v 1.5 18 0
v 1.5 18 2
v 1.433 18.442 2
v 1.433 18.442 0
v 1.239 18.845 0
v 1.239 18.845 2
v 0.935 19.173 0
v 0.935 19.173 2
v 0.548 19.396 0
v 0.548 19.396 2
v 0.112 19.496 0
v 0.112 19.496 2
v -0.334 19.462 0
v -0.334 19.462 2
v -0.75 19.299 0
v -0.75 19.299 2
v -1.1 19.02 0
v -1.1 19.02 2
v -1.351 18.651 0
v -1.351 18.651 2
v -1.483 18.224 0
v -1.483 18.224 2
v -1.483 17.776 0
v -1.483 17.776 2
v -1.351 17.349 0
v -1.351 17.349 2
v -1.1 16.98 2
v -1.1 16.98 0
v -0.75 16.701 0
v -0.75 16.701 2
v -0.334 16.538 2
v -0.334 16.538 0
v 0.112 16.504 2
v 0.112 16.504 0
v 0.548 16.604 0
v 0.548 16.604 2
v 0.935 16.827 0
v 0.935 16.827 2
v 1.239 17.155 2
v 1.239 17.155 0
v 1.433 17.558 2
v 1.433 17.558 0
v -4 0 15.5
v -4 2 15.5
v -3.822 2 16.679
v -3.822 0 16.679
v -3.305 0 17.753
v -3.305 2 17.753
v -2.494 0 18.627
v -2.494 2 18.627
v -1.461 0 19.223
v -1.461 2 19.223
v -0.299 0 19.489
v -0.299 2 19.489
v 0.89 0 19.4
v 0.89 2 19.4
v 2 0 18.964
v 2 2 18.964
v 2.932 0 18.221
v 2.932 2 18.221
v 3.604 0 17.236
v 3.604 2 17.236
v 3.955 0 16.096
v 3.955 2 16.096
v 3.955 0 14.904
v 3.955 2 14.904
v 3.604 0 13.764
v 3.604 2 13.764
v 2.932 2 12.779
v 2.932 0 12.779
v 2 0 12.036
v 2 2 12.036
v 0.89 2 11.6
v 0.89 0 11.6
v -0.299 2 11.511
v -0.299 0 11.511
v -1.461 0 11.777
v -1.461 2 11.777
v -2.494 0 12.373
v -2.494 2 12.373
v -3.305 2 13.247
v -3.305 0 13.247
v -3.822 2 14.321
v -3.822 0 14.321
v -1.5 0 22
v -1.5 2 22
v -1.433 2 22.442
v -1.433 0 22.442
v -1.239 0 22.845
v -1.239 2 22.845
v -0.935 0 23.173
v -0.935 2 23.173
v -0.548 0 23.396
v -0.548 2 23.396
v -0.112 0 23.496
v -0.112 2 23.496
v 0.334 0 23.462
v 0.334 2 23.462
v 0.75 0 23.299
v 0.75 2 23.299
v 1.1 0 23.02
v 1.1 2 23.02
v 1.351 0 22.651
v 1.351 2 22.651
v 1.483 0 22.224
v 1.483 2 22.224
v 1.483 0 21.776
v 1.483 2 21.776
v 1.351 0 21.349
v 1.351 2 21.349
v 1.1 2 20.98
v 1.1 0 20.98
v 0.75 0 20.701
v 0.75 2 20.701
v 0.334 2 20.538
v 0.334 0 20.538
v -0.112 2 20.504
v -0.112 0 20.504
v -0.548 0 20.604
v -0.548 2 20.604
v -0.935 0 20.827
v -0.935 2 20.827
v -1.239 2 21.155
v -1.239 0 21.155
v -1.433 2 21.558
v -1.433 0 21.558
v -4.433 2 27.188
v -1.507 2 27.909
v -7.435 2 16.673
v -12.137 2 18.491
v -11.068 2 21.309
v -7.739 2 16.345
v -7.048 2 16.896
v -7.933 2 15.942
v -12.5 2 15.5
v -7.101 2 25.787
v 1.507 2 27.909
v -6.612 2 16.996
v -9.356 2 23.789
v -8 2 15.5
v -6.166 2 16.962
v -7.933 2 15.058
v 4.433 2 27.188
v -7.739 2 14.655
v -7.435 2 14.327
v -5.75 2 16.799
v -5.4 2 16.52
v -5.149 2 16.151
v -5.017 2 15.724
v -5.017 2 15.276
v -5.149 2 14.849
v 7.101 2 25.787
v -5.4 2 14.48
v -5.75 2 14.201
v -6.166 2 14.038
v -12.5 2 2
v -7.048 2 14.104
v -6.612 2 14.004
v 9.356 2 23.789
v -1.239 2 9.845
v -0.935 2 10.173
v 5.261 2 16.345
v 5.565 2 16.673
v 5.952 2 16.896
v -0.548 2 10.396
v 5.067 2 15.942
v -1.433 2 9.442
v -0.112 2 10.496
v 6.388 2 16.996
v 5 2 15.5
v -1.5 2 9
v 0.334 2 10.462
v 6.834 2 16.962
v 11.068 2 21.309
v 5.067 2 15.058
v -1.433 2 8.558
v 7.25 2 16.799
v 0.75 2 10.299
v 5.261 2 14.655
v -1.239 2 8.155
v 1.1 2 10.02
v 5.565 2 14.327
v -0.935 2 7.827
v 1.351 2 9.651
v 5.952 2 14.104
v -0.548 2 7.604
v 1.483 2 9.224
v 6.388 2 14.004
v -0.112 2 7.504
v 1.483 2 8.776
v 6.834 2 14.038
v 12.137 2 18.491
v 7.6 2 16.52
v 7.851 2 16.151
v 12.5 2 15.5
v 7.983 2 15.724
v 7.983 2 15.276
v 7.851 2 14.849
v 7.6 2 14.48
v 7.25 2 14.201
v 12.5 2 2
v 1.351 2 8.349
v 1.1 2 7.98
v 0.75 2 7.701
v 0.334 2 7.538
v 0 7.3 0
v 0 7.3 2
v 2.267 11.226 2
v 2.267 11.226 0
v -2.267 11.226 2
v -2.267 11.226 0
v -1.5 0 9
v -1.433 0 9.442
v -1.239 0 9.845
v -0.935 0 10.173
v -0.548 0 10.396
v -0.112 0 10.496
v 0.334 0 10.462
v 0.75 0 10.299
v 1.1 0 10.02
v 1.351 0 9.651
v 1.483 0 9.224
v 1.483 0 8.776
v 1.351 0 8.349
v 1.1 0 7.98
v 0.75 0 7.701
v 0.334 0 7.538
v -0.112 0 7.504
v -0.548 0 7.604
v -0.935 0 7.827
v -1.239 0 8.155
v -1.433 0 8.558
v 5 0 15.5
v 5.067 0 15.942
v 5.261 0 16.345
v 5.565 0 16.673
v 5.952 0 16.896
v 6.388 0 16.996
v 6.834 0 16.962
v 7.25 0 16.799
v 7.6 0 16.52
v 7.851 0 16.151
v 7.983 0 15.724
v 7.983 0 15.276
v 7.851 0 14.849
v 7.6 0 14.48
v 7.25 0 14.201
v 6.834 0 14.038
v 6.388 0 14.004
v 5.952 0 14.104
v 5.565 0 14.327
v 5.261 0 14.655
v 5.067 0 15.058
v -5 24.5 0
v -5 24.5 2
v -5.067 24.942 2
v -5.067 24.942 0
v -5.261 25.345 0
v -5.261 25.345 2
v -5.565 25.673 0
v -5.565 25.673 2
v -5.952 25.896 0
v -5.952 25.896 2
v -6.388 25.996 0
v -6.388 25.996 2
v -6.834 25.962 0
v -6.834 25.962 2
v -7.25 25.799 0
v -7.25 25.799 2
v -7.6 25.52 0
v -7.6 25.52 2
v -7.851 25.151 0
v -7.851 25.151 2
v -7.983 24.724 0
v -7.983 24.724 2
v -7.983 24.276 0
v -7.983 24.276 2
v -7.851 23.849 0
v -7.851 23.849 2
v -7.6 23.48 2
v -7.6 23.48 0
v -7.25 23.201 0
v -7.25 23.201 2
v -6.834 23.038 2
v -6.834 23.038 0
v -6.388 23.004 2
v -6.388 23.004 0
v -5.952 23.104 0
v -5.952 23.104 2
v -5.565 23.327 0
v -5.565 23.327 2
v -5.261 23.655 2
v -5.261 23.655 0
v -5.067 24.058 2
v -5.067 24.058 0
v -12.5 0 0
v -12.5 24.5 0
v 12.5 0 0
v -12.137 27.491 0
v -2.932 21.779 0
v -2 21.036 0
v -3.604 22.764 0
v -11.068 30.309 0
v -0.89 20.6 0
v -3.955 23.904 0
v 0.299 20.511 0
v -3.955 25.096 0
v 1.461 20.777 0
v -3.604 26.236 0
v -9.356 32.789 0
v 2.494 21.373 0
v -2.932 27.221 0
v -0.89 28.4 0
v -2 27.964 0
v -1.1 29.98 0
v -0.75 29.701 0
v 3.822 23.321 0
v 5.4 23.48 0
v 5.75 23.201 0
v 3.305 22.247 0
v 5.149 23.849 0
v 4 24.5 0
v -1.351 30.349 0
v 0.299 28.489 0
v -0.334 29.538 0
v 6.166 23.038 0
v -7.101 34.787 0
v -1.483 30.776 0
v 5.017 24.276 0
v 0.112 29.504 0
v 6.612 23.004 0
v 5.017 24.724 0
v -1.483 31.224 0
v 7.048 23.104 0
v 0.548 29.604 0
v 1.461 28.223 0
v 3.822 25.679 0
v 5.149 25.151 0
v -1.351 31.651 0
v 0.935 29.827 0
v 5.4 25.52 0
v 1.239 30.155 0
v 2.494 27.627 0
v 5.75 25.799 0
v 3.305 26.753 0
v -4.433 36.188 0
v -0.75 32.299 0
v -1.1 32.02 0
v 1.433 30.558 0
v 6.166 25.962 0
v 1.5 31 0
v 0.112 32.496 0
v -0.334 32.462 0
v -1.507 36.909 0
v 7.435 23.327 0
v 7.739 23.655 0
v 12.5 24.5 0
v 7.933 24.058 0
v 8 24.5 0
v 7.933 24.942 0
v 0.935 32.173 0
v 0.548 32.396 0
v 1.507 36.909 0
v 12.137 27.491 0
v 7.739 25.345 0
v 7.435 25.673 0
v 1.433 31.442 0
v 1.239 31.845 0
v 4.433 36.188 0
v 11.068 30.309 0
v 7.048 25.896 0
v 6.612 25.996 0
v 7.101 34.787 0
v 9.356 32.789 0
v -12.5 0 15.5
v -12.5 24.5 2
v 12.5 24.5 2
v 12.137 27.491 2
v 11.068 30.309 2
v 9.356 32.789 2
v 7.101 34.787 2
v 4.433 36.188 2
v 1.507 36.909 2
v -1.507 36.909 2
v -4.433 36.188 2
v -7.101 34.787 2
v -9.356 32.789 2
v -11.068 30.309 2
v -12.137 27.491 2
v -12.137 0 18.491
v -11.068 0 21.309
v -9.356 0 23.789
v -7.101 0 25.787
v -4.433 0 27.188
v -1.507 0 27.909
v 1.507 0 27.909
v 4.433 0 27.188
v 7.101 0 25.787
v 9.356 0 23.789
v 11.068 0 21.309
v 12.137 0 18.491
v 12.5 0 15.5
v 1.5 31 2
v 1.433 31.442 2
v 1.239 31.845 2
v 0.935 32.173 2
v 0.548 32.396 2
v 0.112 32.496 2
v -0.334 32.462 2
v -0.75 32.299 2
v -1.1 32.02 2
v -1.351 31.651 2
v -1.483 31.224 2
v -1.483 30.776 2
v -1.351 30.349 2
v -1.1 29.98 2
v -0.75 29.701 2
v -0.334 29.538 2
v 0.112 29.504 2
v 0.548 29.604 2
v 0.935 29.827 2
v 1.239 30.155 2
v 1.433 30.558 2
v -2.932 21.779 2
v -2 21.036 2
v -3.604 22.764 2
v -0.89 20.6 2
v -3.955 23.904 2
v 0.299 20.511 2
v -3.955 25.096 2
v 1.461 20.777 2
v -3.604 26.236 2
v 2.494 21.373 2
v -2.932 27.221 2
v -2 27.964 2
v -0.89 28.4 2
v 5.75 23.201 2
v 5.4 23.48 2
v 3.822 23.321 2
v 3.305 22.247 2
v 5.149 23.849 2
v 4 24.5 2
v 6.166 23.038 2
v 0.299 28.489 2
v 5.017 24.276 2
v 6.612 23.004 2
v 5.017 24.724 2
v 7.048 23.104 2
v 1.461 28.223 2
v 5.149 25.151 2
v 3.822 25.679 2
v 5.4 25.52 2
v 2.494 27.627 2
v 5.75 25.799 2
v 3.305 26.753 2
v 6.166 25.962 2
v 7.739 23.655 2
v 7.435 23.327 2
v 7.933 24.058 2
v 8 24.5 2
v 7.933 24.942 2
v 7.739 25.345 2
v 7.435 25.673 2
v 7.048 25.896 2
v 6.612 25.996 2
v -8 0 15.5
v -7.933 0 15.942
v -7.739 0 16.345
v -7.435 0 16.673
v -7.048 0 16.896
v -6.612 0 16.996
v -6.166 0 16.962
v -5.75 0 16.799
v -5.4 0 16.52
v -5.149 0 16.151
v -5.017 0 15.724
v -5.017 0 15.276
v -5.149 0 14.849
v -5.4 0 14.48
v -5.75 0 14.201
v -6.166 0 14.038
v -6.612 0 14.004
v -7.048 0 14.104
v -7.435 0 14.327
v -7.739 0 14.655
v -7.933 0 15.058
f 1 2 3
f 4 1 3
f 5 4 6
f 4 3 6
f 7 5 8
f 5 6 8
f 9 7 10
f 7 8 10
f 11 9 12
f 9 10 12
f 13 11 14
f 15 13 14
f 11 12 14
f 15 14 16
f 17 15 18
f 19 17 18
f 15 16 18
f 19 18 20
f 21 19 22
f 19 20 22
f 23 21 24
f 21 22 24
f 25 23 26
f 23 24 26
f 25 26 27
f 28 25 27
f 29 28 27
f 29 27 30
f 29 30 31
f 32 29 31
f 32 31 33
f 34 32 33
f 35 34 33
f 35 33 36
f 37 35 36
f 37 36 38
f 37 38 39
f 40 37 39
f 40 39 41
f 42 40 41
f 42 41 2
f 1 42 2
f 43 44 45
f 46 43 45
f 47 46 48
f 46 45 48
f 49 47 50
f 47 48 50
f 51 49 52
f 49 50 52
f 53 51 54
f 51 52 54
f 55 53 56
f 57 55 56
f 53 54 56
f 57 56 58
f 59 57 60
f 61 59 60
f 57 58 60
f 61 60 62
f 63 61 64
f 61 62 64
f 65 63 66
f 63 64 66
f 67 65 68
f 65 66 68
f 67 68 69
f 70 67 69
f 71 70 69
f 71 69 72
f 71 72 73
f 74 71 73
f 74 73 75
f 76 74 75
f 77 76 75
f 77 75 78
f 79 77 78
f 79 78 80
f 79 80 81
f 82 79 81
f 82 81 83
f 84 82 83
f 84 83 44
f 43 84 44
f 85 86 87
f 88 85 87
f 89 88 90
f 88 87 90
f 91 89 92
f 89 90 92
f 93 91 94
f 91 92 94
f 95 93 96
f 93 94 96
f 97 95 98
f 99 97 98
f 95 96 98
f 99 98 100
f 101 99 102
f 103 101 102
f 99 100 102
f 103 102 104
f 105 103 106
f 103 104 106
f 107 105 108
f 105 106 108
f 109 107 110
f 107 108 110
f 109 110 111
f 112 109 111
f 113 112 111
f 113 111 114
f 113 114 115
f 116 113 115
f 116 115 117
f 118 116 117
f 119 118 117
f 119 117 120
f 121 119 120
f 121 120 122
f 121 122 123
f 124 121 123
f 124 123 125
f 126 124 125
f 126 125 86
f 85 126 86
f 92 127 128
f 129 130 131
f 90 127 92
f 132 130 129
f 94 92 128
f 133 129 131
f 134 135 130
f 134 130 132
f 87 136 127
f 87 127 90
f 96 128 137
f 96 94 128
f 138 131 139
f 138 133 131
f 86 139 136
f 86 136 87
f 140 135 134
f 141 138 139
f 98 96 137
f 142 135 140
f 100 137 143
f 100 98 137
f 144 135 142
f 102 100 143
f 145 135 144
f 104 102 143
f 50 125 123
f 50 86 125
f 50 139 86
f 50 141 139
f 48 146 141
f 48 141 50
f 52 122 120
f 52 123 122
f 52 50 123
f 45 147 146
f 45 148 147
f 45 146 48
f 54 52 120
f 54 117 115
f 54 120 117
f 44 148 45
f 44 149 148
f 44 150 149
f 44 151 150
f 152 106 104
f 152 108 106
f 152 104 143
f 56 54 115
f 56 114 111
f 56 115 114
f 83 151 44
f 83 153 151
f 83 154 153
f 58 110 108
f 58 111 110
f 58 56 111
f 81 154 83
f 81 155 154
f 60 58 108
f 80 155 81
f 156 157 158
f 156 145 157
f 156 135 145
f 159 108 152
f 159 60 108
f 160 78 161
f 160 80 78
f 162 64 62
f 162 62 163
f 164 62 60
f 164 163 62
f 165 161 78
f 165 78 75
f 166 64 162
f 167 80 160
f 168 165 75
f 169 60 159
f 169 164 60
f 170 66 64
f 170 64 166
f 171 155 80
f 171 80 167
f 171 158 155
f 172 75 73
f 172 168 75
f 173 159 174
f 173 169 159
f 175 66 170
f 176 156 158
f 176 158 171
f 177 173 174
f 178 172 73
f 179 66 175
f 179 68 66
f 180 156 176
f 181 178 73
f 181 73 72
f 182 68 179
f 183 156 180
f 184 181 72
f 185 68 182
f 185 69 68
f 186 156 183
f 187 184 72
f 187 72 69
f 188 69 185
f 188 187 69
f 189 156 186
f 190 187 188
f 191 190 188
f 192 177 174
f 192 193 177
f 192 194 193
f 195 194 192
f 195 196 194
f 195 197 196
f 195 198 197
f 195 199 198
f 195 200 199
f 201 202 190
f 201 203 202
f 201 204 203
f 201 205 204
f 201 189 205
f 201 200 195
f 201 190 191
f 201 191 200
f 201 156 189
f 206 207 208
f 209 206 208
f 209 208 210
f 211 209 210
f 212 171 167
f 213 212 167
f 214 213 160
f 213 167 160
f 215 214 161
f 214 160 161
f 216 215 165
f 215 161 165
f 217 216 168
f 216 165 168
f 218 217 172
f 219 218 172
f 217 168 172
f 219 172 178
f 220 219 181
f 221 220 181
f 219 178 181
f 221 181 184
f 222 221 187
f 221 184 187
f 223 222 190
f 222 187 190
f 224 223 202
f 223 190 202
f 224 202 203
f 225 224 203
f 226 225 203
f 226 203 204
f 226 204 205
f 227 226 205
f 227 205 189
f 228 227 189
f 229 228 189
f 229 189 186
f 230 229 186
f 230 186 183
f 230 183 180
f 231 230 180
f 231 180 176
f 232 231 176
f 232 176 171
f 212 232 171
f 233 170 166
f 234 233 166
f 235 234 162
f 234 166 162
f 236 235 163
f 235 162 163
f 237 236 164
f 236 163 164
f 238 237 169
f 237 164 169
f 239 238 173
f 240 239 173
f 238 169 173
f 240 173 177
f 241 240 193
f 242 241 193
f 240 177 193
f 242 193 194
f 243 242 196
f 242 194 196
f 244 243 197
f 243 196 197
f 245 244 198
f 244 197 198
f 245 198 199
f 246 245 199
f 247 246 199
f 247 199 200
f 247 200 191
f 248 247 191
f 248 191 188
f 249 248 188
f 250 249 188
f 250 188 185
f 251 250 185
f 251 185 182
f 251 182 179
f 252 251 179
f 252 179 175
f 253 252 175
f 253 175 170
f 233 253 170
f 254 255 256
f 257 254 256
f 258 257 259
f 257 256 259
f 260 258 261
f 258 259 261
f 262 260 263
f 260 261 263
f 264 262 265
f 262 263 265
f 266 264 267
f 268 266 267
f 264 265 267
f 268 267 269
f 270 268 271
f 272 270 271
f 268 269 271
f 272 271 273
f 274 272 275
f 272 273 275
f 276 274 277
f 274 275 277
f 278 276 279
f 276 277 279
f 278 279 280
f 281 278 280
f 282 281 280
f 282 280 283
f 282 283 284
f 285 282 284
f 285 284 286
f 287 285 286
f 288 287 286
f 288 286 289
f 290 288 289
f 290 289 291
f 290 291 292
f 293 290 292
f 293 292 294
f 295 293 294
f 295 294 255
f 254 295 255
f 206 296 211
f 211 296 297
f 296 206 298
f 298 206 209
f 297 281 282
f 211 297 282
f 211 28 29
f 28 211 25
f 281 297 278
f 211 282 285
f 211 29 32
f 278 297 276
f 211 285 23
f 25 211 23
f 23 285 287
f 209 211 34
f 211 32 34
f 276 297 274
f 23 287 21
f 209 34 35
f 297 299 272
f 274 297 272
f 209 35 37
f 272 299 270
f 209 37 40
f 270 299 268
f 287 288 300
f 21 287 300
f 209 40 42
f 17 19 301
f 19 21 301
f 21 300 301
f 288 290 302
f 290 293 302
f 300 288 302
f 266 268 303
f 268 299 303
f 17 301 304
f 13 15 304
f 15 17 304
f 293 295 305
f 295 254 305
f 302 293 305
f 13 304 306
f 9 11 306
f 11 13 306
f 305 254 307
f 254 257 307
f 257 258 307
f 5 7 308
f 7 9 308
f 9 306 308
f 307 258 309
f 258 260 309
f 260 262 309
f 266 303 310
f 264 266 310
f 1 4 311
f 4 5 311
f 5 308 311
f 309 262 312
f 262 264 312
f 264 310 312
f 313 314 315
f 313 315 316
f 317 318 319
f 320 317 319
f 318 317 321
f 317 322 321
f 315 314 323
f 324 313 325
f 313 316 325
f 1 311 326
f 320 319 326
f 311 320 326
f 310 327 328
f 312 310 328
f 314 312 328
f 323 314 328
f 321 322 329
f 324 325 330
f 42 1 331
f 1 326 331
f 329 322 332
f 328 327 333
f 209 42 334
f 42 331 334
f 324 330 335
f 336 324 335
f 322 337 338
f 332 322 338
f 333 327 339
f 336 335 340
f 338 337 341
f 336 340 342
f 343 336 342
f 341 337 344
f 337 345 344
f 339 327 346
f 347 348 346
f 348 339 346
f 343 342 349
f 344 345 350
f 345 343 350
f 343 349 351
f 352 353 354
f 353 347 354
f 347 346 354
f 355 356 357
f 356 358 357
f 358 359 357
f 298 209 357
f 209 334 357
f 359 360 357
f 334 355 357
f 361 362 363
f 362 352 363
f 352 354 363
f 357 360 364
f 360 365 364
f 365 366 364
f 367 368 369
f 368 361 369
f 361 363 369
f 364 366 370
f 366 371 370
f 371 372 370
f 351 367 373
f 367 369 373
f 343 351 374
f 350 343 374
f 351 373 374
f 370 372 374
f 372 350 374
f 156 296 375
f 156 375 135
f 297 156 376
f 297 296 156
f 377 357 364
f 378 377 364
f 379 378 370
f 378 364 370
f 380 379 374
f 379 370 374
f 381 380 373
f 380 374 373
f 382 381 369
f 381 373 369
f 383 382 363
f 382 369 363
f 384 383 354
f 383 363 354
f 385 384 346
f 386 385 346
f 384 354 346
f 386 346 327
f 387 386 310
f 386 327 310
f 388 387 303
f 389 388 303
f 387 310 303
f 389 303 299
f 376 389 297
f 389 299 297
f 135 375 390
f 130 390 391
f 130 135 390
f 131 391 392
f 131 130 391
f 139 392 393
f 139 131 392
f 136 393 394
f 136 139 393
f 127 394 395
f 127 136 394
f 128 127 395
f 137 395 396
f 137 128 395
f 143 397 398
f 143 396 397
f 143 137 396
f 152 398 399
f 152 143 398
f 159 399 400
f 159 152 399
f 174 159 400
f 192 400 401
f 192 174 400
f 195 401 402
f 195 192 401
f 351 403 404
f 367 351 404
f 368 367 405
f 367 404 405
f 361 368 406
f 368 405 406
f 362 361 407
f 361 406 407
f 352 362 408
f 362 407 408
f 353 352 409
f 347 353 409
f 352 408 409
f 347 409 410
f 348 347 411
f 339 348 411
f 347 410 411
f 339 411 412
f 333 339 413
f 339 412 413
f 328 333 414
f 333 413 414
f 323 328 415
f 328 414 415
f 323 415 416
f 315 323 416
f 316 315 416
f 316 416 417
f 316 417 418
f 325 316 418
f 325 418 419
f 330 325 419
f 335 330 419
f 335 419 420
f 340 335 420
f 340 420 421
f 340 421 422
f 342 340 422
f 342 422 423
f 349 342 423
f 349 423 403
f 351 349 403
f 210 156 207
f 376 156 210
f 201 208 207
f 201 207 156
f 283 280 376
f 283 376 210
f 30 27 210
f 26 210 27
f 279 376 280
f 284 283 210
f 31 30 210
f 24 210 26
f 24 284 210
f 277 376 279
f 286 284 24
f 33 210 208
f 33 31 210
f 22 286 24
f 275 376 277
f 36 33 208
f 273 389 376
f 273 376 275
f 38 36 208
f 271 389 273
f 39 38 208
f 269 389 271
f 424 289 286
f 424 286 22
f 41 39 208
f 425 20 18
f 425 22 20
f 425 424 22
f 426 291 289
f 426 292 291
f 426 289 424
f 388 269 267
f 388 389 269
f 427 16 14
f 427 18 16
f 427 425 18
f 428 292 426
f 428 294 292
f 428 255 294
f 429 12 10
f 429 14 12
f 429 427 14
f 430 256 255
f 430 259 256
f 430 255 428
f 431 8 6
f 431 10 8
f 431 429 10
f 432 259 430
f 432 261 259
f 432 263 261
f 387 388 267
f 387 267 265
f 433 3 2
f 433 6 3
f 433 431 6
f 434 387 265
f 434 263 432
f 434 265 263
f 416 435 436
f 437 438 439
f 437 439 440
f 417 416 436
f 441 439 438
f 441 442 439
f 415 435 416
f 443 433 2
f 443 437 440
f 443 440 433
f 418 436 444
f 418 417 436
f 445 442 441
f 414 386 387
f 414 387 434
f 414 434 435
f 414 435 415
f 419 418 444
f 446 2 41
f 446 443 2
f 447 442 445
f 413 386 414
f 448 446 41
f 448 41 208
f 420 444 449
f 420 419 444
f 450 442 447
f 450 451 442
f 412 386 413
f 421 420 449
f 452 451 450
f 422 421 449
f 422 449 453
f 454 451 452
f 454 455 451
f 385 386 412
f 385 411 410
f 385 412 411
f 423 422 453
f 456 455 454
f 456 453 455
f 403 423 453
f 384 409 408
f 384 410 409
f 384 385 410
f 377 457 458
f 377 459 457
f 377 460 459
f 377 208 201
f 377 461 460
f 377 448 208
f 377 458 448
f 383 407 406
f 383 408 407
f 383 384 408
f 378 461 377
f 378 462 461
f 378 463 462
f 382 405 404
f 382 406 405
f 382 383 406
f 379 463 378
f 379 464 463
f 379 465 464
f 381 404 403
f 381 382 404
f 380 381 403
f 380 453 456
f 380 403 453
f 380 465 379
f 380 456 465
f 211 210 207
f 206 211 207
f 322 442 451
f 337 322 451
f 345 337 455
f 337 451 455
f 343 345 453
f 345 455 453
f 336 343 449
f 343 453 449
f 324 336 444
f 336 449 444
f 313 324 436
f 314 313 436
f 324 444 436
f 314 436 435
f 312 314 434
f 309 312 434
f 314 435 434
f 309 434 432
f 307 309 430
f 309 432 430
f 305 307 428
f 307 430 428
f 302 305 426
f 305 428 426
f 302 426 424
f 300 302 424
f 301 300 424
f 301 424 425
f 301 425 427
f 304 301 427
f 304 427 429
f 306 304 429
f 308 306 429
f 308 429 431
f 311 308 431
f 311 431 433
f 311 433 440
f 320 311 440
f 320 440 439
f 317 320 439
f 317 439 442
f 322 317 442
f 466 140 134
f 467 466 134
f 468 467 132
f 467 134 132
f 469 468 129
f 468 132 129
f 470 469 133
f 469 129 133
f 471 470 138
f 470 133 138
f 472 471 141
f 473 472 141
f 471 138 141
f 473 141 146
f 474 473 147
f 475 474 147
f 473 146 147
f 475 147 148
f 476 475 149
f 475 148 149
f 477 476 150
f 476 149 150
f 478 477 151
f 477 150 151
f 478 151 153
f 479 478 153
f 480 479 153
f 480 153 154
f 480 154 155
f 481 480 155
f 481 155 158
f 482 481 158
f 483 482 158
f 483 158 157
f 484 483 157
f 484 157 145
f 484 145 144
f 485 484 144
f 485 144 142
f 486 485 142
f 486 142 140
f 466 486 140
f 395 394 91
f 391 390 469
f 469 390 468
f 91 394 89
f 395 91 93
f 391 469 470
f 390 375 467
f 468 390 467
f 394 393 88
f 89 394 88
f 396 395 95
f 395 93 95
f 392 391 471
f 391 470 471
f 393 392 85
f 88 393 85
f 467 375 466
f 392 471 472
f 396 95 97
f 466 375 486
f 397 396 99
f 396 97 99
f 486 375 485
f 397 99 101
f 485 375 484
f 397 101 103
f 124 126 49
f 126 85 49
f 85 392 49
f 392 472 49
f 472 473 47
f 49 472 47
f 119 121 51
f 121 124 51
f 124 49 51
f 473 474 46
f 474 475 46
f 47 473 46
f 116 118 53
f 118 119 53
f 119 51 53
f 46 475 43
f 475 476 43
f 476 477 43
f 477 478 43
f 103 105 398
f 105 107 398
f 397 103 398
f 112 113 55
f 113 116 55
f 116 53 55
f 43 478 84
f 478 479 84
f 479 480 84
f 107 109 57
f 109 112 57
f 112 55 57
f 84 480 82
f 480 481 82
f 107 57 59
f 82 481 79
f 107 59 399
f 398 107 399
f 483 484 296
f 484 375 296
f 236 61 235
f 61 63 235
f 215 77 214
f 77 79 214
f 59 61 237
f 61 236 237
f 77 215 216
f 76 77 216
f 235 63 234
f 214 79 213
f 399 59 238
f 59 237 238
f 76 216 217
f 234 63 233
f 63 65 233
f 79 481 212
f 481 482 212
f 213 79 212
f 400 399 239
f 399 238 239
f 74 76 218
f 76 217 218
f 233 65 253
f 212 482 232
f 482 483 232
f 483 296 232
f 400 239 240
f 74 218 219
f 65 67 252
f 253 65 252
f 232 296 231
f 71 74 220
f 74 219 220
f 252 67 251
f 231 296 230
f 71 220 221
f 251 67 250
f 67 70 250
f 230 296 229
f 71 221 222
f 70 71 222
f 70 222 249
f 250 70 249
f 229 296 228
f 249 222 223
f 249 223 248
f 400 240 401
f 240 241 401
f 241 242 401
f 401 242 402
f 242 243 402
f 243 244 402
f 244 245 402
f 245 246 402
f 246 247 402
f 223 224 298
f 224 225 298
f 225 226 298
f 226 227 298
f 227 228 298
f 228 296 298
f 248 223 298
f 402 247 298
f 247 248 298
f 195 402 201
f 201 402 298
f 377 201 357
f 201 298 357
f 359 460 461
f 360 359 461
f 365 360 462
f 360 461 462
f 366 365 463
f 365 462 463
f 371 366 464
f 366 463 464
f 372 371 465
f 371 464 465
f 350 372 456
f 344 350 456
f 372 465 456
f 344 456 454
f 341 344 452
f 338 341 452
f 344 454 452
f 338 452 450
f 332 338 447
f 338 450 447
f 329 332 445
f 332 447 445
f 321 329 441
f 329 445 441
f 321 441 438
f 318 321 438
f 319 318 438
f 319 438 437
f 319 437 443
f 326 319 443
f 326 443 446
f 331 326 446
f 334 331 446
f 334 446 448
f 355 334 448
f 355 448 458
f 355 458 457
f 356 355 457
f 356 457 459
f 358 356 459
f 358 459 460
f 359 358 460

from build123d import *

# Parameters (mm, degrees)
PAD_DEPTH       = 2
SKETCH001_W     = 25
SKETCH001_H     = 2
PAD001_DEPTH    = 26
SKETCH002_R     = 1.5
SKETCH002_R_2   = 4
POCKET_DEPTH    = 5
SKETCH003_R     = 1.5
SKETCH003_R_2   = 4
POCKET001_DEPTH = 5


with BuildPart() as part:
    # Sketch → Pad (new body)
    with BuildSketch(Plane.XY):
        with BuildLine():
            Line((-12.5, 0), (12.5, 0))
            Line((12.5, 0), (12.5, 24.5))
            ThreePointArc((12.5, 24.5), (0, 37), (-12.5, 24.5))
            Line((-12.5, 24.5), (-12.5, 0))
        make_face()
    extrude(amount=PAD_DEPTH)

    # Sketch001 (on Face6 of Pad) → Pad001 (join)
    with BuildSketch(Plane.XY.offset(2)):
        with Locations((0, 1)):
            Rectangle(SKETCH001_W, SKETCH001_H)
    extrude(amount=PAD001_DEPTH)

    # Sketch002 (on Face7 of Pad001) → Pocket (cut)
    with BuildSketch(Plane.XY.offset(2)):
        with Locations((0, 31)):
            Circle(SKETCH002_R)
        with Locations((0, 24.5)):
            Circle(SKETCH002_R_2)
        with Locations((0, 18)):
            Circle(SKETCH002_R)
        with Locations((6.5, 24.5)):
            Circle(SKETCH002_R)
        with Locations((-6.5, 24.5)):
            Circle(SKETCH002_R)
        Polygon((2.266718, 11.226343), (-2.266718, 11.226343), (0, 7.300272), align=None)
    extrude(amount=-POCKET_DEPTH, mode=Mode.SUBTRACT)

    # Sketch003 (on Face19 of Pocket) → Pocket001 (cut)
    with BuildSketch(Plane(origin=(0, 2, 0), x_dir=(-1, 0, 0), z_dir=(0, 1, 0))):
        with Locations((0, 22)):
            Circle(SKETCH003_R)
        with Locations((0, 15.5)):
            Circle(SKETCH003_R_2)
        with Locations((0, 9)):
            Circle(SKETCH003_R)
        with Locations((6.5, 15.5)):
            Circle(SKETCH003_R)
        with Locations((-6.5, 15.5)):
            Circle(SKETCH003_R)
        with BuildLine():
            ThreePointArc((12.5, 15.499975), (2.1e-05, 28), (-12.5, 15.500017))
            Line((-15.082001, 13.79535), (-12.5, 15.500017))
            Line((-17.874443, 34.459404), (-15.082001, 13.79535))
            Line((19.595028, 31.666967), (-17.874443, 34.459404))
            Line((12.5, 15.499975), (19.595028, 31.666967))
        make_face()
    extrude(amount=-POCKET001_DEPTH, mode=Mode.SUBTRACT)


solid = part.part
